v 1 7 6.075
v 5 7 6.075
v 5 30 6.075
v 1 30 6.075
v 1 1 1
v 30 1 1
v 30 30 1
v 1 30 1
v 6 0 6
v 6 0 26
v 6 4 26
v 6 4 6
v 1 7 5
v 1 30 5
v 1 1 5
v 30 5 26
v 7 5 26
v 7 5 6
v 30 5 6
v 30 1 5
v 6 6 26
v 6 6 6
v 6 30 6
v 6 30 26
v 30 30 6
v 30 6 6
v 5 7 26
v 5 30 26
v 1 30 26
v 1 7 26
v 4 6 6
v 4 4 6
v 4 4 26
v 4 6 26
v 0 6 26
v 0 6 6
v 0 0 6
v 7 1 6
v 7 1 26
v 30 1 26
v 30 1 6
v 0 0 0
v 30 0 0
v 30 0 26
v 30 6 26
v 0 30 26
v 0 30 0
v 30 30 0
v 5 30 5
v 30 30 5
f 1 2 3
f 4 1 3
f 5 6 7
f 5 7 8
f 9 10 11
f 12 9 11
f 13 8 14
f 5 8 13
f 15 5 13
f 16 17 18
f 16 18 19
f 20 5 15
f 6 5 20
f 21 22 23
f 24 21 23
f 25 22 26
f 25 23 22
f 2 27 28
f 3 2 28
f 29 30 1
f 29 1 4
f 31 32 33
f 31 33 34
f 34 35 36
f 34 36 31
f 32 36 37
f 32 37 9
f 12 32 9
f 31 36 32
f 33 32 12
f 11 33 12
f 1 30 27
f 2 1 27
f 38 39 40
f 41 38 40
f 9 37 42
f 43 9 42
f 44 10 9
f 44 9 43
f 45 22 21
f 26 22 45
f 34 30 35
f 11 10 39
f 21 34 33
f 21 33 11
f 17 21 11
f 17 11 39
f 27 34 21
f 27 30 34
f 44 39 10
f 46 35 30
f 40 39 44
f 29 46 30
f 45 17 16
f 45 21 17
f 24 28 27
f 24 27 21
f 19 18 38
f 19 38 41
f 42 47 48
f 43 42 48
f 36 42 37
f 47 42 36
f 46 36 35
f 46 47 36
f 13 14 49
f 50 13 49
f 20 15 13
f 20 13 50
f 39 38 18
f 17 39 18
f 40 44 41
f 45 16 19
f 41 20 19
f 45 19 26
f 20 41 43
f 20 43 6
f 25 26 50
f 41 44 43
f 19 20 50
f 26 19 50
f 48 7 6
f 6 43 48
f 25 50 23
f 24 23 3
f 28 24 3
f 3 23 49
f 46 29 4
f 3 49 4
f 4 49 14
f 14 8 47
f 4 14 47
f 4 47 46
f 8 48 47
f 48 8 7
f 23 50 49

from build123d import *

# Parameters (mm, degrees)
SKETCH1_W           = 30
SKETCH1_H           = 30
BOSS_EXTRUDE1_DEPTH = 6
BOSS_EXTRUDE4_DEPTH = 20
SKETCH4_W           = 2
SKETCH4_H           = 2
BOSS_EXTRUDE6_DEPTH = 20
SKETCH5_W           = 24
SKETCH5_H           = 6
BOSS_EXTRUDE7_DEPTH = 20
SHELL2_START        = 7
SHELL2_DEPTH        = 23
SHELL2_START_2      = 1
SHELL2_2_DEPTH      = 4
SHELL2_START_3      = 5
SHELL2_3_OUTLINE_W  = 29
SHELL2_3_OUTLINE_H  = 4
SHELL2_3_DEPTH      = 2
SKETCH7_W           = 23
SKETCH7_H           = 1
BOSS_EXTRUDE8_DEPTH = 5
SKETCH9_W           = 1.075143629
SKETCH9_H           = 23
BOSS_EXTRUDE9_DEPTH = 5
SKETCH10_W          = 4
SKETCH10_H          = 23
CUT_EXTRUDE1_DEPTH  = 10
SKETCH11_W          = 23
SKETCH11_H          = 4
CUT_EXTRUDE2_DEPTH  = 10


# Read off the part's stored shape, not the designer's step: Shell2
with BuildPart() as part:
    # Sketch1 → Boss-Extrude1 (new body)
    with BuildSketch(Plane.XY):
        with Locations((15, 15)):
            Rectangle(SKETCH1_W, SKETCH1_H)
    extrude(amount=BOSS_EXTRUDE1_DEPTH)

    # Sketch2 → Boss-Extrude4 (add)
    with BuildSketch(Plane.XY.offset(6)):
        Polygon((5, 6), (6, 6), (6, 30), (0, 30), (0, 6), align=None)
    extrude(amount=BOSS_EXTRUDE4_DEPTH)

    # Sketch4 → Boss-Extrude6 (add)
    with BuildSketch(Plane.XY.offset(6)):
        with Locations((5, 5)):
            Rectangle(SKETCH4_W, SKETCH4_H)
    extrude(amount=BOSS_EXTRUDE6_DEPTH)

    # Sketch5 → Boss-Extrude7 (add)
    with BuildSketch(Plane.XY.offset(6)):
        with Locations((18, 3)):
            Rectangle(SKETCH5_W, SKETCH5_H)
    extrude(amount=BOSS_EXTRUDE7_DEPTH)

    # Shell2 outline → Shell2 (cut)
    with BuildSketch(Plane(origin=(0, 0, 0), x_dir=(1, 0, 0), z_dir=(0, 1, 0)).offset(SHELL2_START)):
        Polygon((5, -5), (30, -5), (30, -1), (1, -1), (1, -25), (5, -25), align=None)
    extrude(amount=SHELL2_DEPTH, mode=Mode.SUBTRACT)

    # Shell2 2 outline → Shell2 2 (cut)
    with BuildSketch(Plane(origin=(0, 0, 0), x_dir=(1, 0, 0), z_dir=(0, 1, 0)).offset(SHELL2_START_2)):
        Polygon((7, -5), (7, -25), (30, -25), (30, -1), (1, -1), (1, -5), align=None)
    extrude(amount=SHELL2_2_DEPTH, mode=Mode.SUBTRACT)

    # Shell2 3 outline → Shell2 3 (cut)
    with BuildSketch(Plane(origin=(0, 0, 0), x_dir=(1, 0, 0), z_dir=(0, 1, 0)).offset(SHELL2_START_3)):
        with Locations((15.5, -3)):
            Rectangle(SHELL2_3_OUTLINE_W, SHELL2_3_OUTLINE_H)
    extrude(amount=SHELL2_3_DEPTH, mode=Mode.SUBTRACT)

    # Sketch7 → Boss-Extrude8 (add)
    with BuildSketch(Plane.XZ.offset(-5)):
        with Locations((18.5, 5.5)):
            Rectangle(SKETCH7_W, SKETCH7_H)
    extrude(amount=BOSS_EXTRUDE8_DEPTH)

    # Sketch9 → Boss-Extrude9 (add)
    with BuildSketch(Plane.ZY.offset(-5)):
        with Locations((5.537571814, 18.5)):
            Rectangle(SKETCH9_W, SKETCH9_H)
    extrude(amount=BOSS_EXTRUDE9_DEPTH)

    # Sketch10 → Cut-Extrude1 (cut)
    with BuildSketch(Plane.XY.offset(26)):
        with Locations((3, 18.5)):
            Rectangle(SKETCH10_W, SKETCH10_H)
    extrude(amount=-CUT_EXTRUDE1_DEPTH, mode=Mode.SUBTRACT)

    # Sketch11 → Cut-Extrude2 (cut)
    with BuildSketch(Plane.XY.offset(26)):
        with Locations((18.5, 3)):
            Rectangle(SKETCH11_W, SKETCH11_H)
    extrude(amount=-CUT_EXTRUDE2_DEPTH, mode=Mode.SUBTRACT)


solid = part.part
